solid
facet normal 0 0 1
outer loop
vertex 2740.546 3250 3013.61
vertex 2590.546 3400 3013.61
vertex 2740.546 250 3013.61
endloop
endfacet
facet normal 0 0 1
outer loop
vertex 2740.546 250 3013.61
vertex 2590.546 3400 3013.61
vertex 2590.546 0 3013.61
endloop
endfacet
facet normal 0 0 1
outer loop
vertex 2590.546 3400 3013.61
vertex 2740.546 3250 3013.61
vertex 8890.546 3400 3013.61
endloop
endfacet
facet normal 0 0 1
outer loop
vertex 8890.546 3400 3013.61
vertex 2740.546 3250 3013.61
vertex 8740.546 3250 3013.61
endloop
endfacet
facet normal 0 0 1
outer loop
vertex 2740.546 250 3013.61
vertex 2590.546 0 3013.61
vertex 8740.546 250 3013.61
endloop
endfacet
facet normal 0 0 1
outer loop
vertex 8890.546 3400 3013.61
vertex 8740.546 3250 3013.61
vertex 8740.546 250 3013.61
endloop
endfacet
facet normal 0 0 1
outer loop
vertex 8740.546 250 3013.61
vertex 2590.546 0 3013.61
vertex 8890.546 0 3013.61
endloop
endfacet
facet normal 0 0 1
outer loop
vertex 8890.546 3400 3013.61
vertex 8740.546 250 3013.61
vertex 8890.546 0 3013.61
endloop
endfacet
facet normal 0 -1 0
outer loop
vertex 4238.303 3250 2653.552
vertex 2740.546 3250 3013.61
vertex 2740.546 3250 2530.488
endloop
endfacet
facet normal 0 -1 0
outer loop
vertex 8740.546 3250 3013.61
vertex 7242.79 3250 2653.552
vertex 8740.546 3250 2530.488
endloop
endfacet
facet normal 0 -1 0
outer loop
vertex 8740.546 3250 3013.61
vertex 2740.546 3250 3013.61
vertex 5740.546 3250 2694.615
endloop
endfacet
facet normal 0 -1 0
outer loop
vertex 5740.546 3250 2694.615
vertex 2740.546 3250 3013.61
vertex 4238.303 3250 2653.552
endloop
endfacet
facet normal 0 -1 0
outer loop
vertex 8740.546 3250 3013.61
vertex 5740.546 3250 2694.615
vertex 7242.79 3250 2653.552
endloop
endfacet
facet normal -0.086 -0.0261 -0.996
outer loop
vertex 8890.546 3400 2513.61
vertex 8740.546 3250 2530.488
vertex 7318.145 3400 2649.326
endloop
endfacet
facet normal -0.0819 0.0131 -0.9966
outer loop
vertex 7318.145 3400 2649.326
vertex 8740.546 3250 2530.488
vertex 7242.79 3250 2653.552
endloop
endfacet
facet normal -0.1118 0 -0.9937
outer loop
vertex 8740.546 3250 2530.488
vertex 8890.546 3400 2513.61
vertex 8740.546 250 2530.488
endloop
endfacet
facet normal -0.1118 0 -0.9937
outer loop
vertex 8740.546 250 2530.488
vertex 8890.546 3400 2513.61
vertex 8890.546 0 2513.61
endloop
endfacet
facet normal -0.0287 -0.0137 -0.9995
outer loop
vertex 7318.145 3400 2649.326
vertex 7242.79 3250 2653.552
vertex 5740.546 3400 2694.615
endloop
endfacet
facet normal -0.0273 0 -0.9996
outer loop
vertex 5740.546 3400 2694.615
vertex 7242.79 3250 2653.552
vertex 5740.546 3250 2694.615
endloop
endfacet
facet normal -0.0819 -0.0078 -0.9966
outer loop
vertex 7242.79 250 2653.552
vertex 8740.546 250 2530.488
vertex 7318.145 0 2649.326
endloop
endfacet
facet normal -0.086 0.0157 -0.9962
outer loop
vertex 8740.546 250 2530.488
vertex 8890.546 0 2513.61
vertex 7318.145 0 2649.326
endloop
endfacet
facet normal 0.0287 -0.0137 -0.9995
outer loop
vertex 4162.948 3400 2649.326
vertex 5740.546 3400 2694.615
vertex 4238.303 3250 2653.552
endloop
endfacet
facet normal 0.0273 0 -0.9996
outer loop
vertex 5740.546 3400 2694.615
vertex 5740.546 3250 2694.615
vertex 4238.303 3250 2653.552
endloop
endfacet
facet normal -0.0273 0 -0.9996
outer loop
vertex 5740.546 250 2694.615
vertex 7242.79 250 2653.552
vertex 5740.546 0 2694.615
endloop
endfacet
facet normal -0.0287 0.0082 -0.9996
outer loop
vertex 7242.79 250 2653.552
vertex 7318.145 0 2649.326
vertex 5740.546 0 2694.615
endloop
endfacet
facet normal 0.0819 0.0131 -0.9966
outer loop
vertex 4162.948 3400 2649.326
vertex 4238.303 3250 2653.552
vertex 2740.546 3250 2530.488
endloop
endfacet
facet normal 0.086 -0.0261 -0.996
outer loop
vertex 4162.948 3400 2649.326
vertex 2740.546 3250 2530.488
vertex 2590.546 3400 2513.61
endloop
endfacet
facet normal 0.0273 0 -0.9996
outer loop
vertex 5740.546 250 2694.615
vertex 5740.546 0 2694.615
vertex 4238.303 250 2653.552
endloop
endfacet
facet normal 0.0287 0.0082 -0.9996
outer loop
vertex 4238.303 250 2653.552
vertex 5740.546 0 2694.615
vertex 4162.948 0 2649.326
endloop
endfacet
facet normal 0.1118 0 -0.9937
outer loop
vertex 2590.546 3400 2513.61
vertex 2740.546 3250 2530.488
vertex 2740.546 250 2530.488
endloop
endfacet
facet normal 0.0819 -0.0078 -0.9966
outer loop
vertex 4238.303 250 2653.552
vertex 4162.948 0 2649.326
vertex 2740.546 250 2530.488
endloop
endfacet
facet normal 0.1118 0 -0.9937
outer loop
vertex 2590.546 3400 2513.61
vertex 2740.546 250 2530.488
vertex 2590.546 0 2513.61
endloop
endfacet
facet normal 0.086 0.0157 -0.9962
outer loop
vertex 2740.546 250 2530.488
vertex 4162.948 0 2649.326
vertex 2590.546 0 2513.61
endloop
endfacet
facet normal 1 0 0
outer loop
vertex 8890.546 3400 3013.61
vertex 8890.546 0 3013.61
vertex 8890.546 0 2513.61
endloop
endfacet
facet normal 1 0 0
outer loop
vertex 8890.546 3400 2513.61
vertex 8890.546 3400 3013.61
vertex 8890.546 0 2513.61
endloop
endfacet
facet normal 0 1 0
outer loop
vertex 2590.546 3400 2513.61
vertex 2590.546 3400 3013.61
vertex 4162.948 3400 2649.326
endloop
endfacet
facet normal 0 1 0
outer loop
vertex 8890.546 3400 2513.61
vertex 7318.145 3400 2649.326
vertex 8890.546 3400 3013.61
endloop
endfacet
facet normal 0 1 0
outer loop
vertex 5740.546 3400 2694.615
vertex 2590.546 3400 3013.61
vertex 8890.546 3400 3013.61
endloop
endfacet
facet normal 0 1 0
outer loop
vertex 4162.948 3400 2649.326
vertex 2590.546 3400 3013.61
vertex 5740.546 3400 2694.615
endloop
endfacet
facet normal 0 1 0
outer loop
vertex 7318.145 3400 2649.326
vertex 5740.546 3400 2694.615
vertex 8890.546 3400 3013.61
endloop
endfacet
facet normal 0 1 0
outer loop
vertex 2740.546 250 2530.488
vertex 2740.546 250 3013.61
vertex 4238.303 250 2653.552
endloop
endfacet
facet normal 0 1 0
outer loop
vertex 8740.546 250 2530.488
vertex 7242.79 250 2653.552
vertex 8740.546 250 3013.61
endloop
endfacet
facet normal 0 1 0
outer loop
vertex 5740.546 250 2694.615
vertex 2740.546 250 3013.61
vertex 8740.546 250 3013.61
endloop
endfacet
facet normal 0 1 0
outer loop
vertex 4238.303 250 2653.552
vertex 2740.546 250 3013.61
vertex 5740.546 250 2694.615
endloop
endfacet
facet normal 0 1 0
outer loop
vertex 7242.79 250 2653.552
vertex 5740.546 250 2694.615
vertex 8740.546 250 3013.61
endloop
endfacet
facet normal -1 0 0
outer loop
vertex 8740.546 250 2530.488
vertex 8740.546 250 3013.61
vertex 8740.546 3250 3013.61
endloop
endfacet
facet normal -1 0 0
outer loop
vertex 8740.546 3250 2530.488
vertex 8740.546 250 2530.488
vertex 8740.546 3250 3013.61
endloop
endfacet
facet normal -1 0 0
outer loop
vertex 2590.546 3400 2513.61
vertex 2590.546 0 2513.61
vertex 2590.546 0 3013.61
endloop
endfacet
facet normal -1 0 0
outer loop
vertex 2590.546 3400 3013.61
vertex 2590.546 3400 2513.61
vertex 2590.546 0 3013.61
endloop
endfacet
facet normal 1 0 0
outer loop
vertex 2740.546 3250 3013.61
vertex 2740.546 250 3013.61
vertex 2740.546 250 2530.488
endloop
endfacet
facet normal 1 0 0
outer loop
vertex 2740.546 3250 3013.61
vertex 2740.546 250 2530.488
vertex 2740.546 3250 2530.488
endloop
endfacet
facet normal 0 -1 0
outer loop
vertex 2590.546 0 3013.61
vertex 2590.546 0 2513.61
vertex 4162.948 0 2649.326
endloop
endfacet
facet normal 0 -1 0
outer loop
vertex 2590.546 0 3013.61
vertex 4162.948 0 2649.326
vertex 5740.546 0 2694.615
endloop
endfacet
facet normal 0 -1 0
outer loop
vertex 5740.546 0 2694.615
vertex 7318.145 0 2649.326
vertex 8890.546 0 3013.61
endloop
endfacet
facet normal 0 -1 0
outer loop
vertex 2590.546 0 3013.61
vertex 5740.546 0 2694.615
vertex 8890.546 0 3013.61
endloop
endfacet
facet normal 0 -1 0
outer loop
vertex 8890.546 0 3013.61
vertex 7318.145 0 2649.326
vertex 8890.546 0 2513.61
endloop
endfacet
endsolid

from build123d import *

# Parameters (mm, degrees)
BOSS_EXTRUDE1_DEPTH = 3550
SKETCH3_W           = 6000
SKETCH3_H           = 3000
CUT_EXTRUDE1_DEPTH  = 6000
SKETCH4_W           = 6300
SKETCH4_H           = 155.176049704
CUT_EXTRUDE2_DEPTH  = 1116


with BuildPart() as part:
    # Sketch2 → Boss-Extrude1 (new body)
    with BuildSketch(Plane(origin=(0, 0, 0), x_dir=(1, 0, 0), z_dir=(0, 1, 0))):
        with BuildLine():
            Line((2590.546480495, -3013.609856922), (8890.546480495, -3013.609856922))
            Line((8890.546480495, -3013.609856922), (8890.546480495, -2513.609856922))
            ThreePointArc((8890.546480495, -2513.609856922), (5740.546480495, -2694.614633818), (2590.546480495, -2513.609856922))
            Line((2590.546480495, -2513.609856922), (2590.546480495, -3013.609856922))
        make_face()
    extrude(amount=BOSS_EXTRUDE1_DEPTH)

    # Sketch3 → Cut-Extrude1 (cut)
    with BuildSketch(Plane.XY.offset(3013.609856922)):
        with Locations((5740.546480495, 1750)):
            Rectangle(SKETCH3_W, SKETCH3_H)
    extrude(amount=-CUT_EXTRUDE1_DEPTH, mode=Mode.SUBTRACT)

    # Sketch4 → Cut-Extrude2 (cut)
    with BuildSketch(Plane.XY.offset(3013.609856922)):
        with Locations((5740.546480495, 3477.588024852)):
            Rectangle(SKETCH4_W, SKETCH4_H)
    extrude(amount=-CUT_EXTRUDE2_DEPTH, mode=Mode.SUBTRACT)


solid = part.part
